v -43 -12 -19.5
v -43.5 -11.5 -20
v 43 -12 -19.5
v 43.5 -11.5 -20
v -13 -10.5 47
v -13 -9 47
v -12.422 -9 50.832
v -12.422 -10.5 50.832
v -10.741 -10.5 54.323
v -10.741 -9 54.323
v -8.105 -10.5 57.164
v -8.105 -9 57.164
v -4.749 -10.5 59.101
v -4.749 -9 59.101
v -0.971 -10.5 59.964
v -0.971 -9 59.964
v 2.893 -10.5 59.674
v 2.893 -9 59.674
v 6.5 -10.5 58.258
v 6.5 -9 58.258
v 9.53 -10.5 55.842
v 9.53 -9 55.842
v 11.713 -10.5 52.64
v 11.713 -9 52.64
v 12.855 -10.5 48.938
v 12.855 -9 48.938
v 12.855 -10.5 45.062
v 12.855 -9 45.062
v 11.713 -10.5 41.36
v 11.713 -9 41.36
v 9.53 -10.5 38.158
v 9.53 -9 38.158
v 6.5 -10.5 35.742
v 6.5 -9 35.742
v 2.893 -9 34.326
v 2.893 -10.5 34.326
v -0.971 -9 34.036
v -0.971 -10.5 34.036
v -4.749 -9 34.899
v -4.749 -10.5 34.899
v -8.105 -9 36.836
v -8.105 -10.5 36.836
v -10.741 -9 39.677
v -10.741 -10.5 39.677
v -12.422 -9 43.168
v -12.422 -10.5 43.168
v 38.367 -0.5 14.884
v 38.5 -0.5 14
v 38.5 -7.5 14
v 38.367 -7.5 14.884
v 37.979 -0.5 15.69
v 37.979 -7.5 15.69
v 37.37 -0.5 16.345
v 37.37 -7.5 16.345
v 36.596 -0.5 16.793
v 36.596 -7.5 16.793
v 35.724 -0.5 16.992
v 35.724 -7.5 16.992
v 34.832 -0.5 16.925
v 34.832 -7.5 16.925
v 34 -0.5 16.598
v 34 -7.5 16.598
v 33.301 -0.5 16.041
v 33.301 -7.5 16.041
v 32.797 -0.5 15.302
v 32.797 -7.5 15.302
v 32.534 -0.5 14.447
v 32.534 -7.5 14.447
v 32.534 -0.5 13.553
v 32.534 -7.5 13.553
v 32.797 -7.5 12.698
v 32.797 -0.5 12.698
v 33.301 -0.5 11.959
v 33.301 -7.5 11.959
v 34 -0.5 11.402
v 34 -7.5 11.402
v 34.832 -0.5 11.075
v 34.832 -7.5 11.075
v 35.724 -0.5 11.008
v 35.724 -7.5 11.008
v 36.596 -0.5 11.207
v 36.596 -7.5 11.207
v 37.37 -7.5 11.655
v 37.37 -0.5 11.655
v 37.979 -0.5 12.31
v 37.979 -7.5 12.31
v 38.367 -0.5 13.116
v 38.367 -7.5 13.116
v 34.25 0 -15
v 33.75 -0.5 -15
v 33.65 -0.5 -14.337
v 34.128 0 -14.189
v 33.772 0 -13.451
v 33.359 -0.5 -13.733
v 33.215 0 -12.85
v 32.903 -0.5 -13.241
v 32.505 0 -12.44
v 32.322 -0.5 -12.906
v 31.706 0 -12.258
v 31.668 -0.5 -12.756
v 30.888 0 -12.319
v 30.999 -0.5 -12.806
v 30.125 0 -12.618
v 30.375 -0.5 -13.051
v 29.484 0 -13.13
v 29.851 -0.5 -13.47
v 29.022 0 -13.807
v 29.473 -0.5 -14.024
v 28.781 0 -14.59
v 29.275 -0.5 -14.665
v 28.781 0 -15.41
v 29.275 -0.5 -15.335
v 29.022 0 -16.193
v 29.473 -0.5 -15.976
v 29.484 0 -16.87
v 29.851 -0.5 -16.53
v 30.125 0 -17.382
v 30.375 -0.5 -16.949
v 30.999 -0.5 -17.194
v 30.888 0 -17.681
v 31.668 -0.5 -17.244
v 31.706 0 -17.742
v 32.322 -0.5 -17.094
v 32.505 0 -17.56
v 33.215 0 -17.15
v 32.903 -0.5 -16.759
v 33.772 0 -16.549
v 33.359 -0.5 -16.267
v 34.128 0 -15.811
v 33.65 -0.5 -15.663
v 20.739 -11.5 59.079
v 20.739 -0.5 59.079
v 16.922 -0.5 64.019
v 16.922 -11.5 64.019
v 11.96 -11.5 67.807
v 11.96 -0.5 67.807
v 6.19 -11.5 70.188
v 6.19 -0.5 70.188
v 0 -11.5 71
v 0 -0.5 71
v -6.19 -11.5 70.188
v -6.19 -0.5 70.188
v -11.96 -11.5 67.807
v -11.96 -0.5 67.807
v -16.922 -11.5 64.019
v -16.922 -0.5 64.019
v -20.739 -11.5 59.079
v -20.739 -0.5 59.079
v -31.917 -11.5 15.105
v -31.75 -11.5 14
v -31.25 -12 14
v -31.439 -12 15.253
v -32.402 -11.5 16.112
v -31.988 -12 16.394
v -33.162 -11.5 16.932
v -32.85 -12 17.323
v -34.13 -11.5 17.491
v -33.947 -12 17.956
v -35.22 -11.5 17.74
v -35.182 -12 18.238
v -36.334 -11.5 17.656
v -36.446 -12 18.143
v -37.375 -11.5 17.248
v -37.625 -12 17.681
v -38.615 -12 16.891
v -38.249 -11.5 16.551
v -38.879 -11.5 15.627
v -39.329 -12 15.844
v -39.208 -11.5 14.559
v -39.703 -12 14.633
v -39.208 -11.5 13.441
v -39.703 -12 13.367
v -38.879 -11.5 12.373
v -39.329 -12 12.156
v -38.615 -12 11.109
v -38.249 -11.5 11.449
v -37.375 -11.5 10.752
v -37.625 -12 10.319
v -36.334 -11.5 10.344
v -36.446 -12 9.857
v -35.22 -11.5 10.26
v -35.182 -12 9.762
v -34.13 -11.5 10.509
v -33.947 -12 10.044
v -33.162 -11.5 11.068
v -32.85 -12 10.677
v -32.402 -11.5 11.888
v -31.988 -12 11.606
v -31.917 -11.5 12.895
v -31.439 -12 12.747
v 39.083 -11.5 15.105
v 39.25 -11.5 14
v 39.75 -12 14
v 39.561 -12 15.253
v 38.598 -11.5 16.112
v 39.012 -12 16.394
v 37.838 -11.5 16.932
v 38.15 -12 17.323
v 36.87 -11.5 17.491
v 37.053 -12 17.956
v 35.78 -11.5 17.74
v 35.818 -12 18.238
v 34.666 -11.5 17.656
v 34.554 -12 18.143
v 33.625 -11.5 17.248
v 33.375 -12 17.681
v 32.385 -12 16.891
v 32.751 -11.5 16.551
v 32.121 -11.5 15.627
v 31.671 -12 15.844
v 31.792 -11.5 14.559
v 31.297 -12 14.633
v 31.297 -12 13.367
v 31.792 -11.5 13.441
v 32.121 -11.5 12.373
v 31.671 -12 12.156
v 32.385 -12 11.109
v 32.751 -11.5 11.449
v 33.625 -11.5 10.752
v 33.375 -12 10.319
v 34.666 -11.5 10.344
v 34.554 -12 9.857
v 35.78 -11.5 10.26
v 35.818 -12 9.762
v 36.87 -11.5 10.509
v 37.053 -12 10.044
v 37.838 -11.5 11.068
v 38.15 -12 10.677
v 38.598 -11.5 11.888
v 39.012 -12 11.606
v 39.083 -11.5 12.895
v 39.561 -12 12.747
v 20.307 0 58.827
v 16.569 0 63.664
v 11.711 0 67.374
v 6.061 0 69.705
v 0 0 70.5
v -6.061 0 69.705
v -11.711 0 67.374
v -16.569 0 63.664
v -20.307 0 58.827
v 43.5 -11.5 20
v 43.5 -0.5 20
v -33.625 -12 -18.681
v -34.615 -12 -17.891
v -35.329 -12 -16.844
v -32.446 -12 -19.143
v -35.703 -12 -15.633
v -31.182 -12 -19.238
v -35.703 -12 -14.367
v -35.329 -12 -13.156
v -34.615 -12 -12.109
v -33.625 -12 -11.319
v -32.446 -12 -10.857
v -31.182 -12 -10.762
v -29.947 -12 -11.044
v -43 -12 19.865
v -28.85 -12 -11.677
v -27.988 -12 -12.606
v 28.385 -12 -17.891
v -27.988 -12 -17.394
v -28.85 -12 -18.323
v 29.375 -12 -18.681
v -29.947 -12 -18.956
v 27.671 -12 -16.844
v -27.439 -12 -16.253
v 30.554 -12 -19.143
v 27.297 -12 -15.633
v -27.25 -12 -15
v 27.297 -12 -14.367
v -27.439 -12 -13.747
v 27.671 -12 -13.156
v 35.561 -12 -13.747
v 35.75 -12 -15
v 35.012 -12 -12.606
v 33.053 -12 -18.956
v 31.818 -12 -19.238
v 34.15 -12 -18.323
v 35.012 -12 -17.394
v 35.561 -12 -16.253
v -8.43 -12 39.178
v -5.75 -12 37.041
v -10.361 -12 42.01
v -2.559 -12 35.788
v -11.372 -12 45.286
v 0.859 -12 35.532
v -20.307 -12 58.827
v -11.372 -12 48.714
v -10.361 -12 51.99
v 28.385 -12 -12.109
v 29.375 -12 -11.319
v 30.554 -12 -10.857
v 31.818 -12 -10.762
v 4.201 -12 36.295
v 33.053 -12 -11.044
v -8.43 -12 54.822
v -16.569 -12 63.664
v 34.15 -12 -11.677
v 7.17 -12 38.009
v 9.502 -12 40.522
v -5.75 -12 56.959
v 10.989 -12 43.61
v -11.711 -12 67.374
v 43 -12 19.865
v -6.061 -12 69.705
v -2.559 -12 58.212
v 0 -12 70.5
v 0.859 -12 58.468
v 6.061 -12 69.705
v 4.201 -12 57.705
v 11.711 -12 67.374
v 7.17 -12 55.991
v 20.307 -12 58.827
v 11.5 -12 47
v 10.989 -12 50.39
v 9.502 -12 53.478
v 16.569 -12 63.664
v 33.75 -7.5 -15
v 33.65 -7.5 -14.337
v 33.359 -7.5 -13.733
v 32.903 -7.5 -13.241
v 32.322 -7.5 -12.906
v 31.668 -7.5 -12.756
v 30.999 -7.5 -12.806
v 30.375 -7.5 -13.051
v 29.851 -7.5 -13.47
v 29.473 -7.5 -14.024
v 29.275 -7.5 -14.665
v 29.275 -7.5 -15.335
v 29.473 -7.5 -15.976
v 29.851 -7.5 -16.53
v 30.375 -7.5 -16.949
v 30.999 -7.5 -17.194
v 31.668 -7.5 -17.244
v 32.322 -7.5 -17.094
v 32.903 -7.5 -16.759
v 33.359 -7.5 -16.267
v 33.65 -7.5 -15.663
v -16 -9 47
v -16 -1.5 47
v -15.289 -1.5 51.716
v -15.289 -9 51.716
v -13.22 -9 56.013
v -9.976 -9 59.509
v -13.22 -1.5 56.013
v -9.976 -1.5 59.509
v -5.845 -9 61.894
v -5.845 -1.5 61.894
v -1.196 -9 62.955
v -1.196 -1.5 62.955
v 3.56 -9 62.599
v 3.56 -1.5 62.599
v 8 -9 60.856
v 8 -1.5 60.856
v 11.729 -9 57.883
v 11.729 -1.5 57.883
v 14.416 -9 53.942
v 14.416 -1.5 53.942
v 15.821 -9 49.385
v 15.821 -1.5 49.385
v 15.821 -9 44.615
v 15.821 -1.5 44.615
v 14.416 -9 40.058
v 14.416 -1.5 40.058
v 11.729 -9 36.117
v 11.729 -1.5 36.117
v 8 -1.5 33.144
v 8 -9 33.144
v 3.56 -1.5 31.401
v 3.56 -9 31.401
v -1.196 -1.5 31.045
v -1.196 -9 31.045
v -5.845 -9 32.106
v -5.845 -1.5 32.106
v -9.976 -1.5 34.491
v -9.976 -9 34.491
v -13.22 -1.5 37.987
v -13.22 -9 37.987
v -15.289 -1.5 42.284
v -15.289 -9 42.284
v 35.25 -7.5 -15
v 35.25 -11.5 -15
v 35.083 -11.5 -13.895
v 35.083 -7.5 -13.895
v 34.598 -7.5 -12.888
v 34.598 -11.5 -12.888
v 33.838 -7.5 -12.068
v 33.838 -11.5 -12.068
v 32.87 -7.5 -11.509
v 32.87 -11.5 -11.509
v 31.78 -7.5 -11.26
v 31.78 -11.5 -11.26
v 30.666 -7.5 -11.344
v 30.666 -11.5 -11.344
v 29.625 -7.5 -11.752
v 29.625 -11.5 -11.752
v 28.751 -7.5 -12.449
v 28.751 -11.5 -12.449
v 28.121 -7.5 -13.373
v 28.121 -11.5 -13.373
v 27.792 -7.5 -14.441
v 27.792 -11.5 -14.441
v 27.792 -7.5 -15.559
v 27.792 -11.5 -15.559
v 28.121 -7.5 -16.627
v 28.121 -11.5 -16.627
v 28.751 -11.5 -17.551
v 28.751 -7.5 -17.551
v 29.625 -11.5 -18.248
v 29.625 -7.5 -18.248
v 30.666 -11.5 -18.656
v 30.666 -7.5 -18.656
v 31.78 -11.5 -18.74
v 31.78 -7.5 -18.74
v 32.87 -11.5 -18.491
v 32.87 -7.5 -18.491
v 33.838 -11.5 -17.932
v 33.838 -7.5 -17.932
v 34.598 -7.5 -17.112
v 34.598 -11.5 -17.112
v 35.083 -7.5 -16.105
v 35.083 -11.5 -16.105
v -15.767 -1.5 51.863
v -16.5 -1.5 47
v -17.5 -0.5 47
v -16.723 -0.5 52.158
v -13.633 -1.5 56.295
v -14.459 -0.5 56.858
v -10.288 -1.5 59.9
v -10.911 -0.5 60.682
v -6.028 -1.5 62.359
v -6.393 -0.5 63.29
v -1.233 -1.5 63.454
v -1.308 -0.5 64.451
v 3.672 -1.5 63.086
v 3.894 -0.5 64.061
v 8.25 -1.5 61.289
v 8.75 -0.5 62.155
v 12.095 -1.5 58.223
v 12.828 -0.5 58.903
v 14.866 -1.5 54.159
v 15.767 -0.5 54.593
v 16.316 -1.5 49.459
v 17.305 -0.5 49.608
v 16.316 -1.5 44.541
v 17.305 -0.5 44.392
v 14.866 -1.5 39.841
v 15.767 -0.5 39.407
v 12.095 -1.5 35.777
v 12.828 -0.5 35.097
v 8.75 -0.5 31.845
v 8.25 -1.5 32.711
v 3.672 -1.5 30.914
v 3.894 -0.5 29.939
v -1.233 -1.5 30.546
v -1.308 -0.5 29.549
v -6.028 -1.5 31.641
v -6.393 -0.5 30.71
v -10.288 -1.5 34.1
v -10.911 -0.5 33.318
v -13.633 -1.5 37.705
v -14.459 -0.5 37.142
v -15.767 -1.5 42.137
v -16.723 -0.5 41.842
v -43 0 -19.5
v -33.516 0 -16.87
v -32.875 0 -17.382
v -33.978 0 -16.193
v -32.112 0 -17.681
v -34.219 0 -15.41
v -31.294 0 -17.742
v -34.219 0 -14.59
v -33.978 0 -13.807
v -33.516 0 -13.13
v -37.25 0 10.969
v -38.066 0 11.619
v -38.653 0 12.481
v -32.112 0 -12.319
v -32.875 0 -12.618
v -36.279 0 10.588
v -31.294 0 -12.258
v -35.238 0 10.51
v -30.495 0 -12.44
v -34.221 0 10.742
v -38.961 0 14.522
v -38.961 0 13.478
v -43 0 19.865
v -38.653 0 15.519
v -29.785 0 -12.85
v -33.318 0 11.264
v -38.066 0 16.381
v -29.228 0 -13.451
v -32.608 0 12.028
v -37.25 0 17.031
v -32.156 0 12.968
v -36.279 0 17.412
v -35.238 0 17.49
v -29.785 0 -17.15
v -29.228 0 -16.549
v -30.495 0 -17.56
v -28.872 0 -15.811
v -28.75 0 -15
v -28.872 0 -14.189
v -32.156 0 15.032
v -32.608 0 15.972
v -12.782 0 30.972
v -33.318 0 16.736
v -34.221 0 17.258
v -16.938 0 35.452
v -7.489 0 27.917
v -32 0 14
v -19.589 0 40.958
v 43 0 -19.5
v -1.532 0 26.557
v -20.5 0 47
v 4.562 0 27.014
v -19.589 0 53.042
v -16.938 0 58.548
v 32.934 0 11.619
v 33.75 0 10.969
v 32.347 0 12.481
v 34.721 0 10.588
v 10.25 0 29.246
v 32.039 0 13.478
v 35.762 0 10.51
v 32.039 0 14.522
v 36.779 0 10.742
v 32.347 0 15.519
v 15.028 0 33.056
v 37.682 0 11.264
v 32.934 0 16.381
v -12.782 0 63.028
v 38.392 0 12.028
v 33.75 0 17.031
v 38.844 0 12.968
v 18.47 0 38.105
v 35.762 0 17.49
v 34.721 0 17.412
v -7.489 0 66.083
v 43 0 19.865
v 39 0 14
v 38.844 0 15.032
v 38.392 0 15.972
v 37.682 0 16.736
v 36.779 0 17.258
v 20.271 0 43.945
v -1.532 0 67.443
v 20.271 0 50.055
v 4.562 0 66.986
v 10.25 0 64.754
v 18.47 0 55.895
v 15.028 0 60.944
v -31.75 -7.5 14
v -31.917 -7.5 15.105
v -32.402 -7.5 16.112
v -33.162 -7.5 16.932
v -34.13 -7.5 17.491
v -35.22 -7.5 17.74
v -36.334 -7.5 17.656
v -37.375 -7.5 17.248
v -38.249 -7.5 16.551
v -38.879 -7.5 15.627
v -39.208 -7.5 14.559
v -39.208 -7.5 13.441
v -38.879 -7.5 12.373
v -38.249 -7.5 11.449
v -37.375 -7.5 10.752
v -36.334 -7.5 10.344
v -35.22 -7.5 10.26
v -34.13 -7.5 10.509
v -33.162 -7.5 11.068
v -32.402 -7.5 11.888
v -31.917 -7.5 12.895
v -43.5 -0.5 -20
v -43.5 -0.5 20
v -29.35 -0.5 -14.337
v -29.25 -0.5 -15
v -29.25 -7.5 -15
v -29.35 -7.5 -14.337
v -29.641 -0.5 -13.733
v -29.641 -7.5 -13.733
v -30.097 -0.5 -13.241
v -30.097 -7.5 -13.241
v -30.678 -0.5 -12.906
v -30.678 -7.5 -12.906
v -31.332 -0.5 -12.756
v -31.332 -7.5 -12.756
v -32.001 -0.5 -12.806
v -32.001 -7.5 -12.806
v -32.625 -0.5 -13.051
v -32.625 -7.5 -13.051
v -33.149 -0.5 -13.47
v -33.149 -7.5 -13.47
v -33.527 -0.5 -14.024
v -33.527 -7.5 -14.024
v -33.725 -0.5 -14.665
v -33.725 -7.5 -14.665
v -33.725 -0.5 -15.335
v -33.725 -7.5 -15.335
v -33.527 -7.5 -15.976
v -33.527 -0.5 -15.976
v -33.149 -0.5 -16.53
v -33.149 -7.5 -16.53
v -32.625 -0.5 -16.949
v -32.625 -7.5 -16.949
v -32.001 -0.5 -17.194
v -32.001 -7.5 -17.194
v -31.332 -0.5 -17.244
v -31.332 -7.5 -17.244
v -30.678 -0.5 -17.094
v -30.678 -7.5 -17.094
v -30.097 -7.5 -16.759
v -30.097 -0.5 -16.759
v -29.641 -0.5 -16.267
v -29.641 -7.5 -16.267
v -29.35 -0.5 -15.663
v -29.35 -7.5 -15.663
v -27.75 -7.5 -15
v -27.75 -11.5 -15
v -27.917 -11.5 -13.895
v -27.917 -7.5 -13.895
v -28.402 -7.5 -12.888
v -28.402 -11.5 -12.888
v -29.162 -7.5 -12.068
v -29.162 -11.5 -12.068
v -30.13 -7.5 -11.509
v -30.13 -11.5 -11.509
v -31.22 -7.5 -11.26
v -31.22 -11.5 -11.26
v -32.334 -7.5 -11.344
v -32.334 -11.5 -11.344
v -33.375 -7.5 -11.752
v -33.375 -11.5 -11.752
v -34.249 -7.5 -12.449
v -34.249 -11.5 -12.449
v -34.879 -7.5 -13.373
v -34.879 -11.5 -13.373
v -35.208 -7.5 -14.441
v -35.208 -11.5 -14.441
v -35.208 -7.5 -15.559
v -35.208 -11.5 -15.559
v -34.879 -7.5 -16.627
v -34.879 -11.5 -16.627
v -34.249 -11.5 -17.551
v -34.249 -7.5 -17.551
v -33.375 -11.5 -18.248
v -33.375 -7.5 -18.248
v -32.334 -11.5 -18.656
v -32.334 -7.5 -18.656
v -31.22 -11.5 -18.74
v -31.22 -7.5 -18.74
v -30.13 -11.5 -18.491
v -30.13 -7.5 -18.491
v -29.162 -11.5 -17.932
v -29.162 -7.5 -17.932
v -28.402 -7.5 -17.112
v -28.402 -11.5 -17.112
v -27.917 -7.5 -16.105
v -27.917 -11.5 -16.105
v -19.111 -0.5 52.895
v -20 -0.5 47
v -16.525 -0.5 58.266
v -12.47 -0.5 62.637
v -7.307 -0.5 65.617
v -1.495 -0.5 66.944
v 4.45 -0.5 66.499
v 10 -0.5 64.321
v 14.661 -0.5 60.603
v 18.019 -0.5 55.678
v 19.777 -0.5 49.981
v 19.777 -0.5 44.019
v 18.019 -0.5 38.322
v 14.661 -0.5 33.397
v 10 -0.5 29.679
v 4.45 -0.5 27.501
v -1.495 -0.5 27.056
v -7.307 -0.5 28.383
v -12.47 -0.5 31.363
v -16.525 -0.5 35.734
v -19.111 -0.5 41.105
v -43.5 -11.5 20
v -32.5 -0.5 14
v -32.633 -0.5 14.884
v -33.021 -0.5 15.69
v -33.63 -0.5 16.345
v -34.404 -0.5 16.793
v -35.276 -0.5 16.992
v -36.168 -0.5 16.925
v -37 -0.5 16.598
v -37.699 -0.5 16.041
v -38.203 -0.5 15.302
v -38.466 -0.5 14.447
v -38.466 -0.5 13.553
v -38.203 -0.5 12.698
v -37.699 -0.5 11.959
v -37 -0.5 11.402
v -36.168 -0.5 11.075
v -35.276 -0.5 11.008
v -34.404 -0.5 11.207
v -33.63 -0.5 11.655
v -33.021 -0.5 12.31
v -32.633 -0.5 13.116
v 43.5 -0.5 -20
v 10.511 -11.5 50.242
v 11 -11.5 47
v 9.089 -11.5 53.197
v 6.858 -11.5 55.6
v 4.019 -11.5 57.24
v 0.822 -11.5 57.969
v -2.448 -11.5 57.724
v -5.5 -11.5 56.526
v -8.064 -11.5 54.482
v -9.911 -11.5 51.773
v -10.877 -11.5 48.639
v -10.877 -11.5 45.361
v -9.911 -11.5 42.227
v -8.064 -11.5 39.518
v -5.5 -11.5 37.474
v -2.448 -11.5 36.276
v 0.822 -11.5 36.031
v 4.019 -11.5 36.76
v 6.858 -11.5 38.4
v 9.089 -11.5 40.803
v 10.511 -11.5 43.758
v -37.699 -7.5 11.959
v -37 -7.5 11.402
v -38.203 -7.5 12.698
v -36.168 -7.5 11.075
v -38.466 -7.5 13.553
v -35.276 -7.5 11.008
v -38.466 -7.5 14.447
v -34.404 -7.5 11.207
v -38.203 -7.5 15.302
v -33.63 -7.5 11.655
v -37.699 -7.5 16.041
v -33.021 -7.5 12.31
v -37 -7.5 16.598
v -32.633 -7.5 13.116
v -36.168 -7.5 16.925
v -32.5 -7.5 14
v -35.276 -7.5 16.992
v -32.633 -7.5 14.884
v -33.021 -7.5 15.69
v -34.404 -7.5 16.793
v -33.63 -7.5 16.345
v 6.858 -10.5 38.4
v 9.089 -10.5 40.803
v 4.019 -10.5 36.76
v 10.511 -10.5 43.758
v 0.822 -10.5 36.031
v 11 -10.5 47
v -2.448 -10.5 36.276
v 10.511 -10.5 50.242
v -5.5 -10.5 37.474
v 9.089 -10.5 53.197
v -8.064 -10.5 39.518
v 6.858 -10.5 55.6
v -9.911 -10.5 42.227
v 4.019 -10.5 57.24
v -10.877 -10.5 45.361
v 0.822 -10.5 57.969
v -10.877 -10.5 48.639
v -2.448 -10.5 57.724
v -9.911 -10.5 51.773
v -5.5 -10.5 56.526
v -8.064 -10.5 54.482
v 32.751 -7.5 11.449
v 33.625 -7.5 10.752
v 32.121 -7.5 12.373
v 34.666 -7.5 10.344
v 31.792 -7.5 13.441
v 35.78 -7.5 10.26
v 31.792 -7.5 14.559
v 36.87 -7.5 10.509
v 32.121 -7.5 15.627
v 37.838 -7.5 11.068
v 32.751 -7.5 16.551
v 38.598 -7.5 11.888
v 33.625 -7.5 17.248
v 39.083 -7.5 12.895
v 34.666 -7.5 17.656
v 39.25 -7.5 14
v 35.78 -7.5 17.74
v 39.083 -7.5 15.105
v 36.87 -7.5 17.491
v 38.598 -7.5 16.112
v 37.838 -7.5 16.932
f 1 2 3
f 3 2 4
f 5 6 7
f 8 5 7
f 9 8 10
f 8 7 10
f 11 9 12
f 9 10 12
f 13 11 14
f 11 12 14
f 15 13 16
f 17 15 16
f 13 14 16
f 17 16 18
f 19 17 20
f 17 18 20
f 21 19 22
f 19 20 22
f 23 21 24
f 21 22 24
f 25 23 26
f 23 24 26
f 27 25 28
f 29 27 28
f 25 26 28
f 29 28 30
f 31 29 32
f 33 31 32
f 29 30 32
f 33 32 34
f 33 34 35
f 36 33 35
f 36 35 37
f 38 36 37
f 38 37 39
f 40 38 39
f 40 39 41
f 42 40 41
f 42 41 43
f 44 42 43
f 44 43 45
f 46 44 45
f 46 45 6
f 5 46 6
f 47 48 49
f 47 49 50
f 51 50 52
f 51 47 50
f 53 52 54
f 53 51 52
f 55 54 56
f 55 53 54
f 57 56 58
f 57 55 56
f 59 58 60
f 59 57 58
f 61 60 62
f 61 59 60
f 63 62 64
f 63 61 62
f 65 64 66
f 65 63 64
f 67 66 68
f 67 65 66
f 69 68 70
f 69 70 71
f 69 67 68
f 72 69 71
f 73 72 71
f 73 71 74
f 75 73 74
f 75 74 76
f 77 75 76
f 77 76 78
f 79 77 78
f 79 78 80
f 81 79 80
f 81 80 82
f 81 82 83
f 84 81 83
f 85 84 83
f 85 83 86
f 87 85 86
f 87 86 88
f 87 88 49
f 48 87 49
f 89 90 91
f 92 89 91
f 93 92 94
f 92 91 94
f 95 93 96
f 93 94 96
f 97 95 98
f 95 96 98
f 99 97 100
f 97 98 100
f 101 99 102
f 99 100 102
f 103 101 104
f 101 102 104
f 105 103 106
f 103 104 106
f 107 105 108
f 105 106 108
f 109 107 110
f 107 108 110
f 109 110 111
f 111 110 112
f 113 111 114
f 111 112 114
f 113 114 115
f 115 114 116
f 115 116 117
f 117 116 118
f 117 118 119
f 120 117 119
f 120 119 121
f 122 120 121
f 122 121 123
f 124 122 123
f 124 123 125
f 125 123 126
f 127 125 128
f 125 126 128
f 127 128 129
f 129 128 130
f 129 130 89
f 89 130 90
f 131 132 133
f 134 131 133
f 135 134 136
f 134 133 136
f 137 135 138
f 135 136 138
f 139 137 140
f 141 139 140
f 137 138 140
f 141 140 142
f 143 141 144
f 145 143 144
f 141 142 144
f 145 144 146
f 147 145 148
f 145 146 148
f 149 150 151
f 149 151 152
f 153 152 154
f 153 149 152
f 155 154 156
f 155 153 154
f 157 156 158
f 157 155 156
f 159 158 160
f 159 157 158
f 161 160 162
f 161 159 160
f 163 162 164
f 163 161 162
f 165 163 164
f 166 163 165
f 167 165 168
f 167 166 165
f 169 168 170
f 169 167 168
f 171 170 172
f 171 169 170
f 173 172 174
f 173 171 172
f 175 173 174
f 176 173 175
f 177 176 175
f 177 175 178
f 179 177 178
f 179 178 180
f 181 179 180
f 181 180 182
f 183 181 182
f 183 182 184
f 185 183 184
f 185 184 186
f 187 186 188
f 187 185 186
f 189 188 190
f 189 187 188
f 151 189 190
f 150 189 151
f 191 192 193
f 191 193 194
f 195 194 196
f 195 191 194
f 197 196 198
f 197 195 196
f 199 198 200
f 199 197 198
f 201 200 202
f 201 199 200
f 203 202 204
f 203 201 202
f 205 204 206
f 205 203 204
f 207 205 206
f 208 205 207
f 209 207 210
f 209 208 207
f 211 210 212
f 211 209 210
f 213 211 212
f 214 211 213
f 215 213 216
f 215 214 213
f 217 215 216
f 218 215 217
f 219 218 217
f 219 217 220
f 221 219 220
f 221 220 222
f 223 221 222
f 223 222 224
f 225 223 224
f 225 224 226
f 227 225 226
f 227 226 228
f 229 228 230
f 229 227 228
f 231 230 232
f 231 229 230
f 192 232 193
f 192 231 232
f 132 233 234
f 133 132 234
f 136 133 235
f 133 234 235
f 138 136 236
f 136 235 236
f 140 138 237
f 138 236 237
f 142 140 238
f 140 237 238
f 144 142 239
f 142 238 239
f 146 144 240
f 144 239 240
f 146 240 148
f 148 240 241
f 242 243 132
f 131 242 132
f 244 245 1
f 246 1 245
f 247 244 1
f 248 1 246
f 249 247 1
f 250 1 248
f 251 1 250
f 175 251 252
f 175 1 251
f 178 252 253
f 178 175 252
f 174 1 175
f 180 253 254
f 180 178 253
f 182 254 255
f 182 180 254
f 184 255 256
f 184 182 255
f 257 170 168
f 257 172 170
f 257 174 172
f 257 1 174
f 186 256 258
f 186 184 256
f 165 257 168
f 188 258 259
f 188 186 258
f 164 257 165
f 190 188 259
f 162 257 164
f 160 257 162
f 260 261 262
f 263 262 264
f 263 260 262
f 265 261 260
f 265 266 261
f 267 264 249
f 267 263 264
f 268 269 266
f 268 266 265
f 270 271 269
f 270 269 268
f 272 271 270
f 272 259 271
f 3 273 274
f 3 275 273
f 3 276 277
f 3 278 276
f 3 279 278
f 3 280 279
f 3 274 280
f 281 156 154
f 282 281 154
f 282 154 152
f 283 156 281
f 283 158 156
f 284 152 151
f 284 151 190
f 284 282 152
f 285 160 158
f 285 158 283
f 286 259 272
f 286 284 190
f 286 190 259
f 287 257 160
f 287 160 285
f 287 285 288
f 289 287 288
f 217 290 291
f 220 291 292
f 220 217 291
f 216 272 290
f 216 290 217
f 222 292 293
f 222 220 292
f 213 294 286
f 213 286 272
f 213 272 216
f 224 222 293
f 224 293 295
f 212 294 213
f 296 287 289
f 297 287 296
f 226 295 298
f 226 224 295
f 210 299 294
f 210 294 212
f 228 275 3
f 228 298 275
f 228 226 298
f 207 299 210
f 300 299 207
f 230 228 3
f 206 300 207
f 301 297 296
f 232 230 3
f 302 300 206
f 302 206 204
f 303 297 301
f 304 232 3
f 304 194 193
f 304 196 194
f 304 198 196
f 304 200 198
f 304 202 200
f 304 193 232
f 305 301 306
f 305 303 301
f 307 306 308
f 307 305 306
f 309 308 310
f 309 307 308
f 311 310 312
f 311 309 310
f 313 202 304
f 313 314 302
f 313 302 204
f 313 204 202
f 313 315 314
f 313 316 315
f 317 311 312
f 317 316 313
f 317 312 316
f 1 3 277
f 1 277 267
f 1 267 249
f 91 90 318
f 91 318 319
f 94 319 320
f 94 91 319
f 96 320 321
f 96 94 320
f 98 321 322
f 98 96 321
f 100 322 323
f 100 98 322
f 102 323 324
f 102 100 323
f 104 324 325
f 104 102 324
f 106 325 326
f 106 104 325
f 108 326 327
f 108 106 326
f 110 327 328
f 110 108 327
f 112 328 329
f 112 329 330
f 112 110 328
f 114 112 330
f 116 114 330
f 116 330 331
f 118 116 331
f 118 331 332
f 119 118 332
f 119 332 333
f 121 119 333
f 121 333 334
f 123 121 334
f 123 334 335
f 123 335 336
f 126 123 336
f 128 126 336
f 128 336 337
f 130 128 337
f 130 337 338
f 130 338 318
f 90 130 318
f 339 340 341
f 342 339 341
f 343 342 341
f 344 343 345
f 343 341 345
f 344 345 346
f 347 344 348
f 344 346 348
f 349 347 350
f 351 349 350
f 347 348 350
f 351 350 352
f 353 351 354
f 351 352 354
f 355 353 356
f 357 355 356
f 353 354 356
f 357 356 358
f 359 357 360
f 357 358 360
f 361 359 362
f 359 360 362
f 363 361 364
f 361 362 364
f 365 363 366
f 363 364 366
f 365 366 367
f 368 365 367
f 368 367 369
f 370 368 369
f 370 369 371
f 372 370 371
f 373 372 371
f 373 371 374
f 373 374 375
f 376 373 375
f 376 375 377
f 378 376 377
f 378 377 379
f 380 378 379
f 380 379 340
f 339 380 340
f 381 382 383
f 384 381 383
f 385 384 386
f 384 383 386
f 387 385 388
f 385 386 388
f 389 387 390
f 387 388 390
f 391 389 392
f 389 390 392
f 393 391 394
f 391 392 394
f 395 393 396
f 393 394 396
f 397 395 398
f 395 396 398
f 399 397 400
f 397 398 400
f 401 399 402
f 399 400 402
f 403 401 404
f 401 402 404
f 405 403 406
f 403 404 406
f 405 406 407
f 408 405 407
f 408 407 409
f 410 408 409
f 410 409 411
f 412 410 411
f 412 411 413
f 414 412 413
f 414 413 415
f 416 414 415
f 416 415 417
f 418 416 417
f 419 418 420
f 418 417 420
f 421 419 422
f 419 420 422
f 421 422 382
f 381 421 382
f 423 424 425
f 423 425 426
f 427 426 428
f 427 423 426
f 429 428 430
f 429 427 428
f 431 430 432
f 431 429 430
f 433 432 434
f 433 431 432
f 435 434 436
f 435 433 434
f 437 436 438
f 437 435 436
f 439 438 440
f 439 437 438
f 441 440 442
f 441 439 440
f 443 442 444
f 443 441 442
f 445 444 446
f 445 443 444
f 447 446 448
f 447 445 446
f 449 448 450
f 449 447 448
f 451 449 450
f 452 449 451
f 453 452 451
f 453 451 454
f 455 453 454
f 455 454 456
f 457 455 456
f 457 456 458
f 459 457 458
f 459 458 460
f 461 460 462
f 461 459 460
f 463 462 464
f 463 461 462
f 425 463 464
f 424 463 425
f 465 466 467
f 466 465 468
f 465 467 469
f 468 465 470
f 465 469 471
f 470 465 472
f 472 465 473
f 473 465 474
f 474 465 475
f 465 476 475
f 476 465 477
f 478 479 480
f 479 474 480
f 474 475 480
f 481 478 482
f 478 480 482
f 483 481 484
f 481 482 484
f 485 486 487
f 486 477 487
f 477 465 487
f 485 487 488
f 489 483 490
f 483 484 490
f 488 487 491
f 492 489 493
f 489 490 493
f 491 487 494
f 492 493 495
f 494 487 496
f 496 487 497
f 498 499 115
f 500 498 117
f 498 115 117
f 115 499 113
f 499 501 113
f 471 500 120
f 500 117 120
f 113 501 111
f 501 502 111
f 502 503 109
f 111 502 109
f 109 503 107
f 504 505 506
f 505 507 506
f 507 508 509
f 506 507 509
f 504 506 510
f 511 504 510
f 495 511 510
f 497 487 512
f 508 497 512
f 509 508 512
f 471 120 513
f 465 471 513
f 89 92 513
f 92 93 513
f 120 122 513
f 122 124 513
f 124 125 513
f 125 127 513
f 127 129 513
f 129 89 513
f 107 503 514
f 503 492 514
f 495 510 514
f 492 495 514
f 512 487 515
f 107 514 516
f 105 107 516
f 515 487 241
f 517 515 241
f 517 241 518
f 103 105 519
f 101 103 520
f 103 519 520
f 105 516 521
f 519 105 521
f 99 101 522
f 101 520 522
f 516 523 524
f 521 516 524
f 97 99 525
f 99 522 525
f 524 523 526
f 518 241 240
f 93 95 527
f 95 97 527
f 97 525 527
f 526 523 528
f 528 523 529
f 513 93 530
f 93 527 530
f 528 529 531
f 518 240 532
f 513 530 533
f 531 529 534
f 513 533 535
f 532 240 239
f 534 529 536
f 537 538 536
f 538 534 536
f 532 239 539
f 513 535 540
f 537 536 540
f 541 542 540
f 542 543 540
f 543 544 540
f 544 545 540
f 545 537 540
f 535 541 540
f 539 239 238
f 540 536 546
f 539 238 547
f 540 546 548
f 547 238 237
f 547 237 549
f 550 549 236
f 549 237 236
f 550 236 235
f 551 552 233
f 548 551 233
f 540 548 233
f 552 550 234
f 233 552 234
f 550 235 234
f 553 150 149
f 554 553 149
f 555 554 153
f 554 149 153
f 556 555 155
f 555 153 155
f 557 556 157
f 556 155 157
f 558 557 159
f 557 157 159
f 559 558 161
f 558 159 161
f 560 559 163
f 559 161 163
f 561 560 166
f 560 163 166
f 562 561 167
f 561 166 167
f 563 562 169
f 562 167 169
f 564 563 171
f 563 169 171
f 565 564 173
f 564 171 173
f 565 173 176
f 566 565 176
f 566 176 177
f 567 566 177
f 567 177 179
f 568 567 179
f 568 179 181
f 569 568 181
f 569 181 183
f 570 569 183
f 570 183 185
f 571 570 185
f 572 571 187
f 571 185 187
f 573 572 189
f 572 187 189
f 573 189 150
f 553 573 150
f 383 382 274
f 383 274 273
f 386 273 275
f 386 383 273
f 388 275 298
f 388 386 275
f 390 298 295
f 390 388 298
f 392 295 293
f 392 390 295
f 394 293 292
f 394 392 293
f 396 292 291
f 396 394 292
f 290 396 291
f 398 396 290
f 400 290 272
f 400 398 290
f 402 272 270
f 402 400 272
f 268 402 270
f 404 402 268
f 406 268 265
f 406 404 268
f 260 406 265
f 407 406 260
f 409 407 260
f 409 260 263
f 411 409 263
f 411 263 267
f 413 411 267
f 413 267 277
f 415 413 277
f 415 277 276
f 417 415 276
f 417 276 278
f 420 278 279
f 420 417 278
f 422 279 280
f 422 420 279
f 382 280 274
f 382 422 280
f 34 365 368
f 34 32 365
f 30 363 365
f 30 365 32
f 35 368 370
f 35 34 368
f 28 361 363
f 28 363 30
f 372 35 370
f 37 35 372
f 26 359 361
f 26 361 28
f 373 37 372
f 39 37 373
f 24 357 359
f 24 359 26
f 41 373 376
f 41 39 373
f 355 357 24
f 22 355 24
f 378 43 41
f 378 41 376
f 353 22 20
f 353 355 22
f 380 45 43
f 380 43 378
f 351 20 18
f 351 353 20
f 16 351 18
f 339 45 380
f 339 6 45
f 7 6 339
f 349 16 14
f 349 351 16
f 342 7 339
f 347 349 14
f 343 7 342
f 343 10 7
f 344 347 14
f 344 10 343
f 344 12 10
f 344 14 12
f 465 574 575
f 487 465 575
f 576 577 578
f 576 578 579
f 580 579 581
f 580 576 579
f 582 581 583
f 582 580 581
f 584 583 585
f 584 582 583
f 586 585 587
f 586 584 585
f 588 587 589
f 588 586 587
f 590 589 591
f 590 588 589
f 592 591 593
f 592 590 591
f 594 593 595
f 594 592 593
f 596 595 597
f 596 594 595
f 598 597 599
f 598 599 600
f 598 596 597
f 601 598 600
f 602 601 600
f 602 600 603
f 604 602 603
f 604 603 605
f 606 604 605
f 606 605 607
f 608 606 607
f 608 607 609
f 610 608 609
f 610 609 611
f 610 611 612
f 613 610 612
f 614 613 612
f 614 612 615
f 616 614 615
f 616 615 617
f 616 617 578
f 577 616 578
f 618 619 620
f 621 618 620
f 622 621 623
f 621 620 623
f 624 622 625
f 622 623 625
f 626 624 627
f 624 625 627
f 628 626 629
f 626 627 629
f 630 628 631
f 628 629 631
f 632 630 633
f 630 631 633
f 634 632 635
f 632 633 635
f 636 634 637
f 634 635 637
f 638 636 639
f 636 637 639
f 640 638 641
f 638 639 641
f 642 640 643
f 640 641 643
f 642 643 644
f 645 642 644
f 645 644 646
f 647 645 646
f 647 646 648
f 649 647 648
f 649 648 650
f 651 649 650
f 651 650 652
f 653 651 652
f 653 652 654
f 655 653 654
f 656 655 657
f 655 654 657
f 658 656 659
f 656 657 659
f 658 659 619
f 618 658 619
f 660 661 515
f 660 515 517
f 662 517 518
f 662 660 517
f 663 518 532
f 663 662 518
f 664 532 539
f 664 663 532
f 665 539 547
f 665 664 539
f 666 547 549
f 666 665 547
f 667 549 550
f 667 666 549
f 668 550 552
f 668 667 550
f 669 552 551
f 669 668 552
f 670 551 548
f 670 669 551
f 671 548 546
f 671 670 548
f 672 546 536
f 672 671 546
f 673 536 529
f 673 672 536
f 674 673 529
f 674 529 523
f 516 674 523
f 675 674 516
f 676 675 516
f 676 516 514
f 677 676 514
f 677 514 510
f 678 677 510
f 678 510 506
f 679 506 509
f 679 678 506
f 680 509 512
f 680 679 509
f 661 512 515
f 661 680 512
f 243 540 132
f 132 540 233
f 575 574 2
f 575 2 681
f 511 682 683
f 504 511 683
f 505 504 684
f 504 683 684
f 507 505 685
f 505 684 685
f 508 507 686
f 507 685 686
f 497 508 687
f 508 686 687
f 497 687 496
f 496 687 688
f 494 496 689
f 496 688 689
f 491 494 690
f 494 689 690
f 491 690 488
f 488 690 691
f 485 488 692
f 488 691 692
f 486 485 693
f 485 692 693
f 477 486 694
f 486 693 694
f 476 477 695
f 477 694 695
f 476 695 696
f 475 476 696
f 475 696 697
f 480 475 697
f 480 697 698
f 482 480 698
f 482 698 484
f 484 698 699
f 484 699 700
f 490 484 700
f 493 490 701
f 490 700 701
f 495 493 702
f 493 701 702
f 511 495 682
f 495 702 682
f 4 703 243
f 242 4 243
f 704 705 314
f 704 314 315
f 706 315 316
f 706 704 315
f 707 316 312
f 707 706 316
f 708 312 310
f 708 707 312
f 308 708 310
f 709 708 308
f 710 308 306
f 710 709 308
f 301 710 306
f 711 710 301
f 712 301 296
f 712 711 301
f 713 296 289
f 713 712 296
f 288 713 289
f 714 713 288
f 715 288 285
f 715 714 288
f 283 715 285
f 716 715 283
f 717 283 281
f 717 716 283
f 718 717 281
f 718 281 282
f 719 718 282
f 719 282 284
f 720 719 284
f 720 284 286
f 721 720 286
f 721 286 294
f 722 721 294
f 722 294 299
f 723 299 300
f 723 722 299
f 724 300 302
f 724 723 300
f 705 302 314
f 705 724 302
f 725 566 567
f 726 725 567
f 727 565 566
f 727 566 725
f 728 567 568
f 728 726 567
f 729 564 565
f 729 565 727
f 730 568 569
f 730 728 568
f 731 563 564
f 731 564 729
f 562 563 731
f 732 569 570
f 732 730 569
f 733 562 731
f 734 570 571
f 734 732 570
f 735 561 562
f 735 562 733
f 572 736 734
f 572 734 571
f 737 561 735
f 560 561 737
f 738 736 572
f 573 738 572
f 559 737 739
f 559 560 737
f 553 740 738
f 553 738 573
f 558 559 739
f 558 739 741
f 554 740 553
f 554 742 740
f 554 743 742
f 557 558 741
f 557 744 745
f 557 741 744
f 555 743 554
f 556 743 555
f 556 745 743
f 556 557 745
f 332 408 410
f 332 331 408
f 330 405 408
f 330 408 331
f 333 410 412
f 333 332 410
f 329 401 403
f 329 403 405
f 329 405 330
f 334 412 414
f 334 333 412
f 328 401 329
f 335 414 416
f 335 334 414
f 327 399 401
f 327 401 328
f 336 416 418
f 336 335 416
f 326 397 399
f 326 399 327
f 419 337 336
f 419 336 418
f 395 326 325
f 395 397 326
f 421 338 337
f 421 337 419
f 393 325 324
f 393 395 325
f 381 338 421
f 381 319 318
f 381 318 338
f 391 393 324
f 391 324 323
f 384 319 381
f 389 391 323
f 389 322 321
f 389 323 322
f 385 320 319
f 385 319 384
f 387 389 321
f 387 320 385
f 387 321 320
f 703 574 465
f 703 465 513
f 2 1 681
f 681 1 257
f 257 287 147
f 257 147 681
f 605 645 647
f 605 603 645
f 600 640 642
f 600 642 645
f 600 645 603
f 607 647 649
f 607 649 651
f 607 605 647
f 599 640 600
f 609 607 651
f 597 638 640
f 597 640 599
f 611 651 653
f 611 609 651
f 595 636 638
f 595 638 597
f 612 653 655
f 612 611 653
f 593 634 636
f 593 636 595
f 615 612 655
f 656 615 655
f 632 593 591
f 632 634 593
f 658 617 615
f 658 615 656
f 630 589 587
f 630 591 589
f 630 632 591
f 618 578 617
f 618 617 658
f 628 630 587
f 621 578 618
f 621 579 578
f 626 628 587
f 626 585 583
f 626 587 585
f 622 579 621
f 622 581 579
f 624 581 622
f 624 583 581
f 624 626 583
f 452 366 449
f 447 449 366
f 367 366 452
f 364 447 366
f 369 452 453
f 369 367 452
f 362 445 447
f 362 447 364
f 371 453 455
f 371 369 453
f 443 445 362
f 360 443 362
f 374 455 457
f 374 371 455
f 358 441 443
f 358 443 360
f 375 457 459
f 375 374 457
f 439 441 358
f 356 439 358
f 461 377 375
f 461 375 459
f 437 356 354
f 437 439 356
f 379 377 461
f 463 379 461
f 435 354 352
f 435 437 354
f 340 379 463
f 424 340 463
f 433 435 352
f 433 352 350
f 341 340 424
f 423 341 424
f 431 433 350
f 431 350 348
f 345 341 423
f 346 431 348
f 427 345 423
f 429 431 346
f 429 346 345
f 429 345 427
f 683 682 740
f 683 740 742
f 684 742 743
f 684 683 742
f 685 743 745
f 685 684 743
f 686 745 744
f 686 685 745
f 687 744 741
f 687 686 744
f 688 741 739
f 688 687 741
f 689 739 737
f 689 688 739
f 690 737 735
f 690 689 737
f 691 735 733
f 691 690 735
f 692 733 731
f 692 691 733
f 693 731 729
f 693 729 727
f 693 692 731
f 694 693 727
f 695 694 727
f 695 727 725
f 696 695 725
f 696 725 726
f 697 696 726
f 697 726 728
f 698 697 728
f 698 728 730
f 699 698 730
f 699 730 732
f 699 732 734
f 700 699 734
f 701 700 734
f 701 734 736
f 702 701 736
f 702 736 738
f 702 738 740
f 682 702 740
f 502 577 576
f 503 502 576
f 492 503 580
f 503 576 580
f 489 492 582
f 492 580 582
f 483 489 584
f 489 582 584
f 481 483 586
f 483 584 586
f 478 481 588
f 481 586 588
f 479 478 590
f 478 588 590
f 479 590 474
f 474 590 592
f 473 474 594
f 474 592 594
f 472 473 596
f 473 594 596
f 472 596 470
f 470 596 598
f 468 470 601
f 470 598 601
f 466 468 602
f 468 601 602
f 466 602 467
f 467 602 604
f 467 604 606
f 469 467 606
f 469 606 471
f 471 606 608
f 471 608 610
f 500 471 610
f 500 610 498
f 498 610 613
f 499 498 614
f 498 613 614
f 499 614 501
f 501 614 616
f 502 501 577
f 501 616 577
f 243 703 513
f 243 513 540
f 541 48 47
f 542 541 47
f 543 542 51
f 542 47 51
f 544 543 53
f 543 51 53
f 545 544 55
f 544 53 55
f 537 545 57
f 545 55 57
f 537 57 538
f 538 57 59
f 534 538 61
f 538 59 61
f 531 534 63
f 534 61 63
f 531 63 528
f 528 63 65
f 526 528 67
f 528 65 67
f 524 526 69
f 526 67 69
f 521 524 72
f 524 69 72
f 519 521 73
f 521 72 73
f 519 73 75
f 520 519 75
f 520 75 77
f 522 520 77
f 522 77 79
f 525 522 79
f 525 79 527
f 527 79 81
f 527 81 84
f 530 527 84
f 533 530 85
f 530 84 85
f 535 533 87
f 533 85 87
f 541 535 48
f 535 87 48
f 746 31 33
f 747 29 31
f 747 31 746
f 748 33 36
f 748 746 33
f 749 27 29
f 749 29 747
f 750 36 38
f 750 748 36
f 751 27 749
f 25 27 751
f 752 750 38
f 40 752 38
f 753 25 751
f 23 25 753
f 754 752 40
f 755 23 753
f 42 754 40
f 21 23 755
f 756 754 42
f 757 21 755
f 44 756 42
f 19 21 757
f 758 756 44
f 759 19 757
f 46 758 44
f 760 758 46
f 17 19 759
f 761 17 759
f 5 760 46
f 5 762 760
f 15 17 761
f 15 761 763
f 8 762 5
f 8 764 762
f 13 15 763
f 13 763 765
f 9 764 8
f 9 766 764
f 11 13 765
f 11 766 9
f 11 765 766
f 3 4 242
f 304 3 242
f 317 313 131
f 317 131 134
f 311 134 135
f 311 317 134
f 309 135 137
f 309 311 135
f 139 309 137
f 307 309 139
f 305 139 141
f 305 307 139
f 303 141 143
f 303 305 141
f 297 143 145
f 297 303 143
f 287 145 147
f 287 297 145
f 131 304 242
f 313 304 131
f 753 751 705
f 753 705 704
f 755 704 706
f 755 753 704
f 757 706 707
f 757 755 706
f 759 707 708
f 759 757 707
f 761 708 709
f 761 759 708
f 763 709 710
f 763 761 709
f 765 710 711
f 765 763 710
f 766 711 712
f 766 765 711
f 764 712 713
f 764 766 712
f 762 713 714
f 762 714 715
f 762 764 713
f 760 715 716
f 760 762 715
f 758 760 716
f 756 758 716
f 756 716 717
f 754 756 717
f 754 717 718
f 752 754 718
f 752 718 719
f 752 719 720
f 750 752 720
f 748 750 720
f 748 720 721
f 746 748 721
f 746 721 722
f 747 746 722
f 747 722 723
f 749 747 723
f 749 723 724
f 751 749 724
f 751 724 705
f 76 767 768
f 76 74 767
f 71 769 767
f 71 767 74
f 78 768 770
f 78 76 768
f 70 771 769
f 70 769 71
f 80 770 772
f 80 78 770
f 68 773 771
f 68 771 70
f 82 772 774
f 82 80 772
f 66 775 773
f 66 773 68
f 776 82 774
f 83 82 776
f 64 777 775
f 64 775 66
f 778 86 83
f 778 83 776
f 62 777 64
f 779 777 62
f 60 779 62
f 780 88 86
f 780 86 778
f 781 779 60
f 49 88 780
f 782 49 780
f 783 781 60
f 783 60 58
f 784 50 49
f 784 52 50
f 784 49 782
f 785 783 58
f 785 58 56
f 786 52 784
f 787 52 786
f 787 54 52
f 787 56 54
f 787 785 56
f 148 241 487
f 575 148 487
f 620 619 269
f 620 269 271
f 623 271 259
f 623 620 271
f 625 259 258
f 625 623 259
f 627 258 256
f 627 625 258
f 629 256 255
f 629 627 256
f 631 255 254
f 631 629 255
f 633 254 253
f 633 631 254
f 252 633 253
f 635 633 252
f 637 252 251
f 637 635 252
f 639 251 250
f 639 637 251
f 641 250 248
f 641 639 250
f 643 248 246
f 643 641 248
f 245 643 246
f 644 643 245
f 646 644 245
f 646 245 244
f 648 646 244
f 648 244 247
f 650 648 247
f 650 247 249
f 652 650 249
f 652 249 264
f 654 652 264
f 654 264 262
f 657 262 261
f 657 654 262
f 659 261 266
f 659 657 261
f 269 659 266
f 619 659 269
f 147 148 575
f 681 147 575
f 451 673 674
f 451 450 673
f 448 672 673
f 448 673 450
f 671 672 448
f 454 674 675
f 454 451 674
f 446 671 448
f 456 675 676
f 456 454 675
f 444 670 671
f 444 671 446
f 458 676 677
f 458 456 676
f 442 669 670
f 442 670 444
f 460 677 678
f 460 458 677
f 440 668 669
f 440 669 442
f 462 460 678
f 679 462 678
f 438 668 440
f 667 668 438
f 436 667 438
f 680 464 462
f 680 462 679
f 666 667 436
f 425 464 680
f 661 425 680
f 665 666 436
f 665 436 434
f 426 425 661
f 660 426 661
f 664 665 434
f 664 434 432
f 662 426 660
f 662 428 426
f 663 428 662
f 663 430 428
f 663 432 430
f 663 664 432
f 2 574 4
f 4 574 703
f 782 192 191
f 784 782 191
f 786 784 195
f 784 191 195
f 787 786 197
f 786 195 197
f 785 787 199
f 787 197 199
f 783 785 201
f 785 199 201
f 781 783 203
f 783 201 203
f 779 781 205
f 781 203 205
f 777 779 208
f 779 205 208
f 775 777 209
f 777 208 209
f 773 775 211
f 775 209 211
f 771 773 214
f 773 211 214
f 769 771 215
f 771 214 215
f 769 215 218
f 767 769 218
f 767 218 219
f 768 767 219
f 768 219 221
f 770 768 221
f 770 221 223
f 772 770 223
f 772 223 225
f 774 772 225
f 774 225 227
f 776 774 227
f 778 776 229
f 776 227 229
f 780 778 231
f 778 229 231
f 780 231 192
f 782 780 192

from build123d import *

# Parameters (mm, degrees)
F0_R      = 11
F0_W      = 87
F0_H      = 40
F0_R_2    = 3.75
F0_R_3    = 3
F0_R_4    = 2.25
F1_DEPTH  = 12
F2_R      = 3.75
F2_R_2    = 3
F2_R_3    = 2.25
F3_DEPTH  = 4.5
F4_R      = 20
F5_DEPTH  = 0.5
F6_R      = 16.5
F7_DEPTH  = 1.5
F8_R      = 16
F9_DEPTH  = 9
F10_R     = 13
F11_DEPTH = 10.5
F12_SIZE2 = 0.5
F12_SIZE  = 0.5
F13_SIZE2 = 0.49999
F13_SIZE  = 0.49999
F14_SIZE2 = 0.99999
F14_SIZE  = 0.99999


# Not quite as in the source:
# - a fillet or chamfer is up to 0.001 mm smaller than in the source, because OpenCascade refuses the exact size


with BuildPart() as f1:
    # F0 (on Front) → F1 (new body)
    with BuildSketch(Plane.XZ):
        with BuildLine():
            Line((-43.5, 20), (43.5, 20))
            Line((43.5, 20), (20.7387457553, 59.0790903836))
            ThreePointArc((20.7387457553, 59.0790903836), (0, 71), (-20.7387457553, 59.0790903836))
            Line((-20.7387457553, 59.0790903836), (-43.5, 20))
        make_face()
        with Locations((0, 47)):
            Circle(F0_R, mode=Mode.SUBTRACT)
        Rectangle(F0_W, F0_H)
        with Locations((-31.5, -15)):
            Circle(F0_R_2, mode=Mode.SUBTRACT)
        with Locations((-35.5, 14)):
            Circle(F0_R_2, mode=Mode.SUBTRACT)
        with Locations((31.5, -15)):
            Circle(F0_R_2, mode=Mode.SUBTRACT)
        with Locations((35.5, 14)):
            Circle(F0_R_2, mode=Mode.SUBTRACT)
        with Locations((-35.5, 14)):
            Circle(F0_R_2)
        with Locations((-35.5, 14)):
            Circle(F0_R_3, mode=Mode.SUBTRACT)
        with Locations((-31.5, -15)):
            Circle(F0_R_2)
        with Locations((-31.5, -15)):
            Circle(F0_R_4, mode=Mode.SUBTRACT)
        with Locations((35.5, 14)):
            Circle(F0_R_2)
        with Locations((35.5, 14)):
            Circle(F0_R_3, mode=Mode.SUBTRACT)
        with Locations((31.5, -15)):
            Circle(F0_R_2)
        with Locations((31.5, -15)):
            Circle(F0_R_4, mode=Mode.SUBTRACT)
    extrude(amount=F1_DEPTH)

    # F2 (on face) → F3 (cut)
    with BuildSketch(Plane.XZ.offset(12)):
        with Locations((-35.5, 14)):
            Circle(F2_R)
        with Locations((-35.5, 14)):
            Circle(F2_R_2, mode=Mode.SUBTRACT)
        with Locations((35.5, 14)):
            Circle(F2_R)
        with Locations((35.5, 14)):
            Circle(F2_R_2, mode=Mode.SUBTRACT)
        with Locations((-31.5, -15)):
            Circle(F2_R)
        with Locations((-31.5, -15)):
            Circle(F2_R_3, mode=Mode.SUBTRACT)
        with Locations((31.5, -15)):
            Circle(F2_R)
        with Locations((31.5, -15)):
            Circle(F2_R_3, mode=Mode.SUBTRACT)
    extrude(amount=-F3_DEPTH, mode=Mode.SUBTRACT)

    # F4 (on face) → F5 (cut)
    with BuildSketch(Plane(origin=(0, 0, 0), x_dir=(-1, 0, 0), z_dir=(0, 1, 0))):
        with Locations((0, 47)):
            Circle(F4_R)
    extrude(amount=-F5_DEPTH, mode=Mode.SUBTRACT)

    # F6 (on face) → F7 (cut)
    with BuildSketch(Plane(origin=(0, 0, 0), x_dir=(-1, 0, 0), z_dir=(0, 1, 0))):
        with Locations((0, 47)):
            Circle(F6_R)
    extrude(amount=-F7_DEPTH, mode=Mode.SUBTRACT)

    # F8 (on face) → F9 (cut)
    with BuildSketch(Plane(origin=(0, 0, 0), x_dir=(-1, 0, 0), z_dir=(0, 1, 0))):
        with Locations((0, 47)):
            Circle(F8_R)
    extrude(amount=-F9_DEPTH, mode=Mode.SUBTRACT)

    # F10 (on face) → F11 (cut)
    with BuildSketch(Plane(origin=(0, 0, 0), x_dir=(-1, 0, 0), z_dir=(0, 1, 0))):
        with Locations((0, 47)):
            Circle(F10_R)
    extrude(amount=-F11_DEPTH, mode=Mode.SUBTRACT)

    # F12
    f12_edges = [f1.edges().sort_by_distance(p)[0] for p in [
        (-32.119373, -12, 39.539545),
        (0, -12, 71),
        (-43.5, -12, 0),
        (32.119373, -12, 39.539545),
        (0, -12, -20),
        (43.5, -12, 0),
        (-35.25, -12, -15),
        (-39.25, -12, 14),
        (27.75, -12, -15),
        (31.75, -12, 14),
        (-11, -12, 47),
    ]]
    chamfer(f12_edges, length=F12_SIZE, length2=F12_SIZE2)

    # F13 (size 0.5 and 0.5 in the source; OpenCascade refuses exactly that, so slightly less here)
    f13_edges = [f1.edges().sort_by_distance(p)[0] for p in [
        (-32.119373, 0, 39.539545),
        (0, 0, 71),
        (-43.5, 0, 0),
        (32.119373, 0, 39.539545),
        (0, 0, -20),
        (43.5, 0, 0),
        (-33.75, 0, -15),
        (-38.5, 0, 14),
        (29.25, 0, -15),
        (32.5, 0, 14),
        (20, 0, 47),
    ]]
    chamfer(f13_edges, length=F13_SIZE, length2=F13_SIZE2)

    # F14 (size 1 and 1 in the source; OpenCascade refuses exactly that, so slightly less here)
    f14_edges = [f1.edges().sort_by_distance(p)[0] for p in [
        (16.5, -0.5, 47),
    ]]
    chamfer(f14_edges, length=F14_SIZE, length2=F14_SIZE2)


solid = f1.part
